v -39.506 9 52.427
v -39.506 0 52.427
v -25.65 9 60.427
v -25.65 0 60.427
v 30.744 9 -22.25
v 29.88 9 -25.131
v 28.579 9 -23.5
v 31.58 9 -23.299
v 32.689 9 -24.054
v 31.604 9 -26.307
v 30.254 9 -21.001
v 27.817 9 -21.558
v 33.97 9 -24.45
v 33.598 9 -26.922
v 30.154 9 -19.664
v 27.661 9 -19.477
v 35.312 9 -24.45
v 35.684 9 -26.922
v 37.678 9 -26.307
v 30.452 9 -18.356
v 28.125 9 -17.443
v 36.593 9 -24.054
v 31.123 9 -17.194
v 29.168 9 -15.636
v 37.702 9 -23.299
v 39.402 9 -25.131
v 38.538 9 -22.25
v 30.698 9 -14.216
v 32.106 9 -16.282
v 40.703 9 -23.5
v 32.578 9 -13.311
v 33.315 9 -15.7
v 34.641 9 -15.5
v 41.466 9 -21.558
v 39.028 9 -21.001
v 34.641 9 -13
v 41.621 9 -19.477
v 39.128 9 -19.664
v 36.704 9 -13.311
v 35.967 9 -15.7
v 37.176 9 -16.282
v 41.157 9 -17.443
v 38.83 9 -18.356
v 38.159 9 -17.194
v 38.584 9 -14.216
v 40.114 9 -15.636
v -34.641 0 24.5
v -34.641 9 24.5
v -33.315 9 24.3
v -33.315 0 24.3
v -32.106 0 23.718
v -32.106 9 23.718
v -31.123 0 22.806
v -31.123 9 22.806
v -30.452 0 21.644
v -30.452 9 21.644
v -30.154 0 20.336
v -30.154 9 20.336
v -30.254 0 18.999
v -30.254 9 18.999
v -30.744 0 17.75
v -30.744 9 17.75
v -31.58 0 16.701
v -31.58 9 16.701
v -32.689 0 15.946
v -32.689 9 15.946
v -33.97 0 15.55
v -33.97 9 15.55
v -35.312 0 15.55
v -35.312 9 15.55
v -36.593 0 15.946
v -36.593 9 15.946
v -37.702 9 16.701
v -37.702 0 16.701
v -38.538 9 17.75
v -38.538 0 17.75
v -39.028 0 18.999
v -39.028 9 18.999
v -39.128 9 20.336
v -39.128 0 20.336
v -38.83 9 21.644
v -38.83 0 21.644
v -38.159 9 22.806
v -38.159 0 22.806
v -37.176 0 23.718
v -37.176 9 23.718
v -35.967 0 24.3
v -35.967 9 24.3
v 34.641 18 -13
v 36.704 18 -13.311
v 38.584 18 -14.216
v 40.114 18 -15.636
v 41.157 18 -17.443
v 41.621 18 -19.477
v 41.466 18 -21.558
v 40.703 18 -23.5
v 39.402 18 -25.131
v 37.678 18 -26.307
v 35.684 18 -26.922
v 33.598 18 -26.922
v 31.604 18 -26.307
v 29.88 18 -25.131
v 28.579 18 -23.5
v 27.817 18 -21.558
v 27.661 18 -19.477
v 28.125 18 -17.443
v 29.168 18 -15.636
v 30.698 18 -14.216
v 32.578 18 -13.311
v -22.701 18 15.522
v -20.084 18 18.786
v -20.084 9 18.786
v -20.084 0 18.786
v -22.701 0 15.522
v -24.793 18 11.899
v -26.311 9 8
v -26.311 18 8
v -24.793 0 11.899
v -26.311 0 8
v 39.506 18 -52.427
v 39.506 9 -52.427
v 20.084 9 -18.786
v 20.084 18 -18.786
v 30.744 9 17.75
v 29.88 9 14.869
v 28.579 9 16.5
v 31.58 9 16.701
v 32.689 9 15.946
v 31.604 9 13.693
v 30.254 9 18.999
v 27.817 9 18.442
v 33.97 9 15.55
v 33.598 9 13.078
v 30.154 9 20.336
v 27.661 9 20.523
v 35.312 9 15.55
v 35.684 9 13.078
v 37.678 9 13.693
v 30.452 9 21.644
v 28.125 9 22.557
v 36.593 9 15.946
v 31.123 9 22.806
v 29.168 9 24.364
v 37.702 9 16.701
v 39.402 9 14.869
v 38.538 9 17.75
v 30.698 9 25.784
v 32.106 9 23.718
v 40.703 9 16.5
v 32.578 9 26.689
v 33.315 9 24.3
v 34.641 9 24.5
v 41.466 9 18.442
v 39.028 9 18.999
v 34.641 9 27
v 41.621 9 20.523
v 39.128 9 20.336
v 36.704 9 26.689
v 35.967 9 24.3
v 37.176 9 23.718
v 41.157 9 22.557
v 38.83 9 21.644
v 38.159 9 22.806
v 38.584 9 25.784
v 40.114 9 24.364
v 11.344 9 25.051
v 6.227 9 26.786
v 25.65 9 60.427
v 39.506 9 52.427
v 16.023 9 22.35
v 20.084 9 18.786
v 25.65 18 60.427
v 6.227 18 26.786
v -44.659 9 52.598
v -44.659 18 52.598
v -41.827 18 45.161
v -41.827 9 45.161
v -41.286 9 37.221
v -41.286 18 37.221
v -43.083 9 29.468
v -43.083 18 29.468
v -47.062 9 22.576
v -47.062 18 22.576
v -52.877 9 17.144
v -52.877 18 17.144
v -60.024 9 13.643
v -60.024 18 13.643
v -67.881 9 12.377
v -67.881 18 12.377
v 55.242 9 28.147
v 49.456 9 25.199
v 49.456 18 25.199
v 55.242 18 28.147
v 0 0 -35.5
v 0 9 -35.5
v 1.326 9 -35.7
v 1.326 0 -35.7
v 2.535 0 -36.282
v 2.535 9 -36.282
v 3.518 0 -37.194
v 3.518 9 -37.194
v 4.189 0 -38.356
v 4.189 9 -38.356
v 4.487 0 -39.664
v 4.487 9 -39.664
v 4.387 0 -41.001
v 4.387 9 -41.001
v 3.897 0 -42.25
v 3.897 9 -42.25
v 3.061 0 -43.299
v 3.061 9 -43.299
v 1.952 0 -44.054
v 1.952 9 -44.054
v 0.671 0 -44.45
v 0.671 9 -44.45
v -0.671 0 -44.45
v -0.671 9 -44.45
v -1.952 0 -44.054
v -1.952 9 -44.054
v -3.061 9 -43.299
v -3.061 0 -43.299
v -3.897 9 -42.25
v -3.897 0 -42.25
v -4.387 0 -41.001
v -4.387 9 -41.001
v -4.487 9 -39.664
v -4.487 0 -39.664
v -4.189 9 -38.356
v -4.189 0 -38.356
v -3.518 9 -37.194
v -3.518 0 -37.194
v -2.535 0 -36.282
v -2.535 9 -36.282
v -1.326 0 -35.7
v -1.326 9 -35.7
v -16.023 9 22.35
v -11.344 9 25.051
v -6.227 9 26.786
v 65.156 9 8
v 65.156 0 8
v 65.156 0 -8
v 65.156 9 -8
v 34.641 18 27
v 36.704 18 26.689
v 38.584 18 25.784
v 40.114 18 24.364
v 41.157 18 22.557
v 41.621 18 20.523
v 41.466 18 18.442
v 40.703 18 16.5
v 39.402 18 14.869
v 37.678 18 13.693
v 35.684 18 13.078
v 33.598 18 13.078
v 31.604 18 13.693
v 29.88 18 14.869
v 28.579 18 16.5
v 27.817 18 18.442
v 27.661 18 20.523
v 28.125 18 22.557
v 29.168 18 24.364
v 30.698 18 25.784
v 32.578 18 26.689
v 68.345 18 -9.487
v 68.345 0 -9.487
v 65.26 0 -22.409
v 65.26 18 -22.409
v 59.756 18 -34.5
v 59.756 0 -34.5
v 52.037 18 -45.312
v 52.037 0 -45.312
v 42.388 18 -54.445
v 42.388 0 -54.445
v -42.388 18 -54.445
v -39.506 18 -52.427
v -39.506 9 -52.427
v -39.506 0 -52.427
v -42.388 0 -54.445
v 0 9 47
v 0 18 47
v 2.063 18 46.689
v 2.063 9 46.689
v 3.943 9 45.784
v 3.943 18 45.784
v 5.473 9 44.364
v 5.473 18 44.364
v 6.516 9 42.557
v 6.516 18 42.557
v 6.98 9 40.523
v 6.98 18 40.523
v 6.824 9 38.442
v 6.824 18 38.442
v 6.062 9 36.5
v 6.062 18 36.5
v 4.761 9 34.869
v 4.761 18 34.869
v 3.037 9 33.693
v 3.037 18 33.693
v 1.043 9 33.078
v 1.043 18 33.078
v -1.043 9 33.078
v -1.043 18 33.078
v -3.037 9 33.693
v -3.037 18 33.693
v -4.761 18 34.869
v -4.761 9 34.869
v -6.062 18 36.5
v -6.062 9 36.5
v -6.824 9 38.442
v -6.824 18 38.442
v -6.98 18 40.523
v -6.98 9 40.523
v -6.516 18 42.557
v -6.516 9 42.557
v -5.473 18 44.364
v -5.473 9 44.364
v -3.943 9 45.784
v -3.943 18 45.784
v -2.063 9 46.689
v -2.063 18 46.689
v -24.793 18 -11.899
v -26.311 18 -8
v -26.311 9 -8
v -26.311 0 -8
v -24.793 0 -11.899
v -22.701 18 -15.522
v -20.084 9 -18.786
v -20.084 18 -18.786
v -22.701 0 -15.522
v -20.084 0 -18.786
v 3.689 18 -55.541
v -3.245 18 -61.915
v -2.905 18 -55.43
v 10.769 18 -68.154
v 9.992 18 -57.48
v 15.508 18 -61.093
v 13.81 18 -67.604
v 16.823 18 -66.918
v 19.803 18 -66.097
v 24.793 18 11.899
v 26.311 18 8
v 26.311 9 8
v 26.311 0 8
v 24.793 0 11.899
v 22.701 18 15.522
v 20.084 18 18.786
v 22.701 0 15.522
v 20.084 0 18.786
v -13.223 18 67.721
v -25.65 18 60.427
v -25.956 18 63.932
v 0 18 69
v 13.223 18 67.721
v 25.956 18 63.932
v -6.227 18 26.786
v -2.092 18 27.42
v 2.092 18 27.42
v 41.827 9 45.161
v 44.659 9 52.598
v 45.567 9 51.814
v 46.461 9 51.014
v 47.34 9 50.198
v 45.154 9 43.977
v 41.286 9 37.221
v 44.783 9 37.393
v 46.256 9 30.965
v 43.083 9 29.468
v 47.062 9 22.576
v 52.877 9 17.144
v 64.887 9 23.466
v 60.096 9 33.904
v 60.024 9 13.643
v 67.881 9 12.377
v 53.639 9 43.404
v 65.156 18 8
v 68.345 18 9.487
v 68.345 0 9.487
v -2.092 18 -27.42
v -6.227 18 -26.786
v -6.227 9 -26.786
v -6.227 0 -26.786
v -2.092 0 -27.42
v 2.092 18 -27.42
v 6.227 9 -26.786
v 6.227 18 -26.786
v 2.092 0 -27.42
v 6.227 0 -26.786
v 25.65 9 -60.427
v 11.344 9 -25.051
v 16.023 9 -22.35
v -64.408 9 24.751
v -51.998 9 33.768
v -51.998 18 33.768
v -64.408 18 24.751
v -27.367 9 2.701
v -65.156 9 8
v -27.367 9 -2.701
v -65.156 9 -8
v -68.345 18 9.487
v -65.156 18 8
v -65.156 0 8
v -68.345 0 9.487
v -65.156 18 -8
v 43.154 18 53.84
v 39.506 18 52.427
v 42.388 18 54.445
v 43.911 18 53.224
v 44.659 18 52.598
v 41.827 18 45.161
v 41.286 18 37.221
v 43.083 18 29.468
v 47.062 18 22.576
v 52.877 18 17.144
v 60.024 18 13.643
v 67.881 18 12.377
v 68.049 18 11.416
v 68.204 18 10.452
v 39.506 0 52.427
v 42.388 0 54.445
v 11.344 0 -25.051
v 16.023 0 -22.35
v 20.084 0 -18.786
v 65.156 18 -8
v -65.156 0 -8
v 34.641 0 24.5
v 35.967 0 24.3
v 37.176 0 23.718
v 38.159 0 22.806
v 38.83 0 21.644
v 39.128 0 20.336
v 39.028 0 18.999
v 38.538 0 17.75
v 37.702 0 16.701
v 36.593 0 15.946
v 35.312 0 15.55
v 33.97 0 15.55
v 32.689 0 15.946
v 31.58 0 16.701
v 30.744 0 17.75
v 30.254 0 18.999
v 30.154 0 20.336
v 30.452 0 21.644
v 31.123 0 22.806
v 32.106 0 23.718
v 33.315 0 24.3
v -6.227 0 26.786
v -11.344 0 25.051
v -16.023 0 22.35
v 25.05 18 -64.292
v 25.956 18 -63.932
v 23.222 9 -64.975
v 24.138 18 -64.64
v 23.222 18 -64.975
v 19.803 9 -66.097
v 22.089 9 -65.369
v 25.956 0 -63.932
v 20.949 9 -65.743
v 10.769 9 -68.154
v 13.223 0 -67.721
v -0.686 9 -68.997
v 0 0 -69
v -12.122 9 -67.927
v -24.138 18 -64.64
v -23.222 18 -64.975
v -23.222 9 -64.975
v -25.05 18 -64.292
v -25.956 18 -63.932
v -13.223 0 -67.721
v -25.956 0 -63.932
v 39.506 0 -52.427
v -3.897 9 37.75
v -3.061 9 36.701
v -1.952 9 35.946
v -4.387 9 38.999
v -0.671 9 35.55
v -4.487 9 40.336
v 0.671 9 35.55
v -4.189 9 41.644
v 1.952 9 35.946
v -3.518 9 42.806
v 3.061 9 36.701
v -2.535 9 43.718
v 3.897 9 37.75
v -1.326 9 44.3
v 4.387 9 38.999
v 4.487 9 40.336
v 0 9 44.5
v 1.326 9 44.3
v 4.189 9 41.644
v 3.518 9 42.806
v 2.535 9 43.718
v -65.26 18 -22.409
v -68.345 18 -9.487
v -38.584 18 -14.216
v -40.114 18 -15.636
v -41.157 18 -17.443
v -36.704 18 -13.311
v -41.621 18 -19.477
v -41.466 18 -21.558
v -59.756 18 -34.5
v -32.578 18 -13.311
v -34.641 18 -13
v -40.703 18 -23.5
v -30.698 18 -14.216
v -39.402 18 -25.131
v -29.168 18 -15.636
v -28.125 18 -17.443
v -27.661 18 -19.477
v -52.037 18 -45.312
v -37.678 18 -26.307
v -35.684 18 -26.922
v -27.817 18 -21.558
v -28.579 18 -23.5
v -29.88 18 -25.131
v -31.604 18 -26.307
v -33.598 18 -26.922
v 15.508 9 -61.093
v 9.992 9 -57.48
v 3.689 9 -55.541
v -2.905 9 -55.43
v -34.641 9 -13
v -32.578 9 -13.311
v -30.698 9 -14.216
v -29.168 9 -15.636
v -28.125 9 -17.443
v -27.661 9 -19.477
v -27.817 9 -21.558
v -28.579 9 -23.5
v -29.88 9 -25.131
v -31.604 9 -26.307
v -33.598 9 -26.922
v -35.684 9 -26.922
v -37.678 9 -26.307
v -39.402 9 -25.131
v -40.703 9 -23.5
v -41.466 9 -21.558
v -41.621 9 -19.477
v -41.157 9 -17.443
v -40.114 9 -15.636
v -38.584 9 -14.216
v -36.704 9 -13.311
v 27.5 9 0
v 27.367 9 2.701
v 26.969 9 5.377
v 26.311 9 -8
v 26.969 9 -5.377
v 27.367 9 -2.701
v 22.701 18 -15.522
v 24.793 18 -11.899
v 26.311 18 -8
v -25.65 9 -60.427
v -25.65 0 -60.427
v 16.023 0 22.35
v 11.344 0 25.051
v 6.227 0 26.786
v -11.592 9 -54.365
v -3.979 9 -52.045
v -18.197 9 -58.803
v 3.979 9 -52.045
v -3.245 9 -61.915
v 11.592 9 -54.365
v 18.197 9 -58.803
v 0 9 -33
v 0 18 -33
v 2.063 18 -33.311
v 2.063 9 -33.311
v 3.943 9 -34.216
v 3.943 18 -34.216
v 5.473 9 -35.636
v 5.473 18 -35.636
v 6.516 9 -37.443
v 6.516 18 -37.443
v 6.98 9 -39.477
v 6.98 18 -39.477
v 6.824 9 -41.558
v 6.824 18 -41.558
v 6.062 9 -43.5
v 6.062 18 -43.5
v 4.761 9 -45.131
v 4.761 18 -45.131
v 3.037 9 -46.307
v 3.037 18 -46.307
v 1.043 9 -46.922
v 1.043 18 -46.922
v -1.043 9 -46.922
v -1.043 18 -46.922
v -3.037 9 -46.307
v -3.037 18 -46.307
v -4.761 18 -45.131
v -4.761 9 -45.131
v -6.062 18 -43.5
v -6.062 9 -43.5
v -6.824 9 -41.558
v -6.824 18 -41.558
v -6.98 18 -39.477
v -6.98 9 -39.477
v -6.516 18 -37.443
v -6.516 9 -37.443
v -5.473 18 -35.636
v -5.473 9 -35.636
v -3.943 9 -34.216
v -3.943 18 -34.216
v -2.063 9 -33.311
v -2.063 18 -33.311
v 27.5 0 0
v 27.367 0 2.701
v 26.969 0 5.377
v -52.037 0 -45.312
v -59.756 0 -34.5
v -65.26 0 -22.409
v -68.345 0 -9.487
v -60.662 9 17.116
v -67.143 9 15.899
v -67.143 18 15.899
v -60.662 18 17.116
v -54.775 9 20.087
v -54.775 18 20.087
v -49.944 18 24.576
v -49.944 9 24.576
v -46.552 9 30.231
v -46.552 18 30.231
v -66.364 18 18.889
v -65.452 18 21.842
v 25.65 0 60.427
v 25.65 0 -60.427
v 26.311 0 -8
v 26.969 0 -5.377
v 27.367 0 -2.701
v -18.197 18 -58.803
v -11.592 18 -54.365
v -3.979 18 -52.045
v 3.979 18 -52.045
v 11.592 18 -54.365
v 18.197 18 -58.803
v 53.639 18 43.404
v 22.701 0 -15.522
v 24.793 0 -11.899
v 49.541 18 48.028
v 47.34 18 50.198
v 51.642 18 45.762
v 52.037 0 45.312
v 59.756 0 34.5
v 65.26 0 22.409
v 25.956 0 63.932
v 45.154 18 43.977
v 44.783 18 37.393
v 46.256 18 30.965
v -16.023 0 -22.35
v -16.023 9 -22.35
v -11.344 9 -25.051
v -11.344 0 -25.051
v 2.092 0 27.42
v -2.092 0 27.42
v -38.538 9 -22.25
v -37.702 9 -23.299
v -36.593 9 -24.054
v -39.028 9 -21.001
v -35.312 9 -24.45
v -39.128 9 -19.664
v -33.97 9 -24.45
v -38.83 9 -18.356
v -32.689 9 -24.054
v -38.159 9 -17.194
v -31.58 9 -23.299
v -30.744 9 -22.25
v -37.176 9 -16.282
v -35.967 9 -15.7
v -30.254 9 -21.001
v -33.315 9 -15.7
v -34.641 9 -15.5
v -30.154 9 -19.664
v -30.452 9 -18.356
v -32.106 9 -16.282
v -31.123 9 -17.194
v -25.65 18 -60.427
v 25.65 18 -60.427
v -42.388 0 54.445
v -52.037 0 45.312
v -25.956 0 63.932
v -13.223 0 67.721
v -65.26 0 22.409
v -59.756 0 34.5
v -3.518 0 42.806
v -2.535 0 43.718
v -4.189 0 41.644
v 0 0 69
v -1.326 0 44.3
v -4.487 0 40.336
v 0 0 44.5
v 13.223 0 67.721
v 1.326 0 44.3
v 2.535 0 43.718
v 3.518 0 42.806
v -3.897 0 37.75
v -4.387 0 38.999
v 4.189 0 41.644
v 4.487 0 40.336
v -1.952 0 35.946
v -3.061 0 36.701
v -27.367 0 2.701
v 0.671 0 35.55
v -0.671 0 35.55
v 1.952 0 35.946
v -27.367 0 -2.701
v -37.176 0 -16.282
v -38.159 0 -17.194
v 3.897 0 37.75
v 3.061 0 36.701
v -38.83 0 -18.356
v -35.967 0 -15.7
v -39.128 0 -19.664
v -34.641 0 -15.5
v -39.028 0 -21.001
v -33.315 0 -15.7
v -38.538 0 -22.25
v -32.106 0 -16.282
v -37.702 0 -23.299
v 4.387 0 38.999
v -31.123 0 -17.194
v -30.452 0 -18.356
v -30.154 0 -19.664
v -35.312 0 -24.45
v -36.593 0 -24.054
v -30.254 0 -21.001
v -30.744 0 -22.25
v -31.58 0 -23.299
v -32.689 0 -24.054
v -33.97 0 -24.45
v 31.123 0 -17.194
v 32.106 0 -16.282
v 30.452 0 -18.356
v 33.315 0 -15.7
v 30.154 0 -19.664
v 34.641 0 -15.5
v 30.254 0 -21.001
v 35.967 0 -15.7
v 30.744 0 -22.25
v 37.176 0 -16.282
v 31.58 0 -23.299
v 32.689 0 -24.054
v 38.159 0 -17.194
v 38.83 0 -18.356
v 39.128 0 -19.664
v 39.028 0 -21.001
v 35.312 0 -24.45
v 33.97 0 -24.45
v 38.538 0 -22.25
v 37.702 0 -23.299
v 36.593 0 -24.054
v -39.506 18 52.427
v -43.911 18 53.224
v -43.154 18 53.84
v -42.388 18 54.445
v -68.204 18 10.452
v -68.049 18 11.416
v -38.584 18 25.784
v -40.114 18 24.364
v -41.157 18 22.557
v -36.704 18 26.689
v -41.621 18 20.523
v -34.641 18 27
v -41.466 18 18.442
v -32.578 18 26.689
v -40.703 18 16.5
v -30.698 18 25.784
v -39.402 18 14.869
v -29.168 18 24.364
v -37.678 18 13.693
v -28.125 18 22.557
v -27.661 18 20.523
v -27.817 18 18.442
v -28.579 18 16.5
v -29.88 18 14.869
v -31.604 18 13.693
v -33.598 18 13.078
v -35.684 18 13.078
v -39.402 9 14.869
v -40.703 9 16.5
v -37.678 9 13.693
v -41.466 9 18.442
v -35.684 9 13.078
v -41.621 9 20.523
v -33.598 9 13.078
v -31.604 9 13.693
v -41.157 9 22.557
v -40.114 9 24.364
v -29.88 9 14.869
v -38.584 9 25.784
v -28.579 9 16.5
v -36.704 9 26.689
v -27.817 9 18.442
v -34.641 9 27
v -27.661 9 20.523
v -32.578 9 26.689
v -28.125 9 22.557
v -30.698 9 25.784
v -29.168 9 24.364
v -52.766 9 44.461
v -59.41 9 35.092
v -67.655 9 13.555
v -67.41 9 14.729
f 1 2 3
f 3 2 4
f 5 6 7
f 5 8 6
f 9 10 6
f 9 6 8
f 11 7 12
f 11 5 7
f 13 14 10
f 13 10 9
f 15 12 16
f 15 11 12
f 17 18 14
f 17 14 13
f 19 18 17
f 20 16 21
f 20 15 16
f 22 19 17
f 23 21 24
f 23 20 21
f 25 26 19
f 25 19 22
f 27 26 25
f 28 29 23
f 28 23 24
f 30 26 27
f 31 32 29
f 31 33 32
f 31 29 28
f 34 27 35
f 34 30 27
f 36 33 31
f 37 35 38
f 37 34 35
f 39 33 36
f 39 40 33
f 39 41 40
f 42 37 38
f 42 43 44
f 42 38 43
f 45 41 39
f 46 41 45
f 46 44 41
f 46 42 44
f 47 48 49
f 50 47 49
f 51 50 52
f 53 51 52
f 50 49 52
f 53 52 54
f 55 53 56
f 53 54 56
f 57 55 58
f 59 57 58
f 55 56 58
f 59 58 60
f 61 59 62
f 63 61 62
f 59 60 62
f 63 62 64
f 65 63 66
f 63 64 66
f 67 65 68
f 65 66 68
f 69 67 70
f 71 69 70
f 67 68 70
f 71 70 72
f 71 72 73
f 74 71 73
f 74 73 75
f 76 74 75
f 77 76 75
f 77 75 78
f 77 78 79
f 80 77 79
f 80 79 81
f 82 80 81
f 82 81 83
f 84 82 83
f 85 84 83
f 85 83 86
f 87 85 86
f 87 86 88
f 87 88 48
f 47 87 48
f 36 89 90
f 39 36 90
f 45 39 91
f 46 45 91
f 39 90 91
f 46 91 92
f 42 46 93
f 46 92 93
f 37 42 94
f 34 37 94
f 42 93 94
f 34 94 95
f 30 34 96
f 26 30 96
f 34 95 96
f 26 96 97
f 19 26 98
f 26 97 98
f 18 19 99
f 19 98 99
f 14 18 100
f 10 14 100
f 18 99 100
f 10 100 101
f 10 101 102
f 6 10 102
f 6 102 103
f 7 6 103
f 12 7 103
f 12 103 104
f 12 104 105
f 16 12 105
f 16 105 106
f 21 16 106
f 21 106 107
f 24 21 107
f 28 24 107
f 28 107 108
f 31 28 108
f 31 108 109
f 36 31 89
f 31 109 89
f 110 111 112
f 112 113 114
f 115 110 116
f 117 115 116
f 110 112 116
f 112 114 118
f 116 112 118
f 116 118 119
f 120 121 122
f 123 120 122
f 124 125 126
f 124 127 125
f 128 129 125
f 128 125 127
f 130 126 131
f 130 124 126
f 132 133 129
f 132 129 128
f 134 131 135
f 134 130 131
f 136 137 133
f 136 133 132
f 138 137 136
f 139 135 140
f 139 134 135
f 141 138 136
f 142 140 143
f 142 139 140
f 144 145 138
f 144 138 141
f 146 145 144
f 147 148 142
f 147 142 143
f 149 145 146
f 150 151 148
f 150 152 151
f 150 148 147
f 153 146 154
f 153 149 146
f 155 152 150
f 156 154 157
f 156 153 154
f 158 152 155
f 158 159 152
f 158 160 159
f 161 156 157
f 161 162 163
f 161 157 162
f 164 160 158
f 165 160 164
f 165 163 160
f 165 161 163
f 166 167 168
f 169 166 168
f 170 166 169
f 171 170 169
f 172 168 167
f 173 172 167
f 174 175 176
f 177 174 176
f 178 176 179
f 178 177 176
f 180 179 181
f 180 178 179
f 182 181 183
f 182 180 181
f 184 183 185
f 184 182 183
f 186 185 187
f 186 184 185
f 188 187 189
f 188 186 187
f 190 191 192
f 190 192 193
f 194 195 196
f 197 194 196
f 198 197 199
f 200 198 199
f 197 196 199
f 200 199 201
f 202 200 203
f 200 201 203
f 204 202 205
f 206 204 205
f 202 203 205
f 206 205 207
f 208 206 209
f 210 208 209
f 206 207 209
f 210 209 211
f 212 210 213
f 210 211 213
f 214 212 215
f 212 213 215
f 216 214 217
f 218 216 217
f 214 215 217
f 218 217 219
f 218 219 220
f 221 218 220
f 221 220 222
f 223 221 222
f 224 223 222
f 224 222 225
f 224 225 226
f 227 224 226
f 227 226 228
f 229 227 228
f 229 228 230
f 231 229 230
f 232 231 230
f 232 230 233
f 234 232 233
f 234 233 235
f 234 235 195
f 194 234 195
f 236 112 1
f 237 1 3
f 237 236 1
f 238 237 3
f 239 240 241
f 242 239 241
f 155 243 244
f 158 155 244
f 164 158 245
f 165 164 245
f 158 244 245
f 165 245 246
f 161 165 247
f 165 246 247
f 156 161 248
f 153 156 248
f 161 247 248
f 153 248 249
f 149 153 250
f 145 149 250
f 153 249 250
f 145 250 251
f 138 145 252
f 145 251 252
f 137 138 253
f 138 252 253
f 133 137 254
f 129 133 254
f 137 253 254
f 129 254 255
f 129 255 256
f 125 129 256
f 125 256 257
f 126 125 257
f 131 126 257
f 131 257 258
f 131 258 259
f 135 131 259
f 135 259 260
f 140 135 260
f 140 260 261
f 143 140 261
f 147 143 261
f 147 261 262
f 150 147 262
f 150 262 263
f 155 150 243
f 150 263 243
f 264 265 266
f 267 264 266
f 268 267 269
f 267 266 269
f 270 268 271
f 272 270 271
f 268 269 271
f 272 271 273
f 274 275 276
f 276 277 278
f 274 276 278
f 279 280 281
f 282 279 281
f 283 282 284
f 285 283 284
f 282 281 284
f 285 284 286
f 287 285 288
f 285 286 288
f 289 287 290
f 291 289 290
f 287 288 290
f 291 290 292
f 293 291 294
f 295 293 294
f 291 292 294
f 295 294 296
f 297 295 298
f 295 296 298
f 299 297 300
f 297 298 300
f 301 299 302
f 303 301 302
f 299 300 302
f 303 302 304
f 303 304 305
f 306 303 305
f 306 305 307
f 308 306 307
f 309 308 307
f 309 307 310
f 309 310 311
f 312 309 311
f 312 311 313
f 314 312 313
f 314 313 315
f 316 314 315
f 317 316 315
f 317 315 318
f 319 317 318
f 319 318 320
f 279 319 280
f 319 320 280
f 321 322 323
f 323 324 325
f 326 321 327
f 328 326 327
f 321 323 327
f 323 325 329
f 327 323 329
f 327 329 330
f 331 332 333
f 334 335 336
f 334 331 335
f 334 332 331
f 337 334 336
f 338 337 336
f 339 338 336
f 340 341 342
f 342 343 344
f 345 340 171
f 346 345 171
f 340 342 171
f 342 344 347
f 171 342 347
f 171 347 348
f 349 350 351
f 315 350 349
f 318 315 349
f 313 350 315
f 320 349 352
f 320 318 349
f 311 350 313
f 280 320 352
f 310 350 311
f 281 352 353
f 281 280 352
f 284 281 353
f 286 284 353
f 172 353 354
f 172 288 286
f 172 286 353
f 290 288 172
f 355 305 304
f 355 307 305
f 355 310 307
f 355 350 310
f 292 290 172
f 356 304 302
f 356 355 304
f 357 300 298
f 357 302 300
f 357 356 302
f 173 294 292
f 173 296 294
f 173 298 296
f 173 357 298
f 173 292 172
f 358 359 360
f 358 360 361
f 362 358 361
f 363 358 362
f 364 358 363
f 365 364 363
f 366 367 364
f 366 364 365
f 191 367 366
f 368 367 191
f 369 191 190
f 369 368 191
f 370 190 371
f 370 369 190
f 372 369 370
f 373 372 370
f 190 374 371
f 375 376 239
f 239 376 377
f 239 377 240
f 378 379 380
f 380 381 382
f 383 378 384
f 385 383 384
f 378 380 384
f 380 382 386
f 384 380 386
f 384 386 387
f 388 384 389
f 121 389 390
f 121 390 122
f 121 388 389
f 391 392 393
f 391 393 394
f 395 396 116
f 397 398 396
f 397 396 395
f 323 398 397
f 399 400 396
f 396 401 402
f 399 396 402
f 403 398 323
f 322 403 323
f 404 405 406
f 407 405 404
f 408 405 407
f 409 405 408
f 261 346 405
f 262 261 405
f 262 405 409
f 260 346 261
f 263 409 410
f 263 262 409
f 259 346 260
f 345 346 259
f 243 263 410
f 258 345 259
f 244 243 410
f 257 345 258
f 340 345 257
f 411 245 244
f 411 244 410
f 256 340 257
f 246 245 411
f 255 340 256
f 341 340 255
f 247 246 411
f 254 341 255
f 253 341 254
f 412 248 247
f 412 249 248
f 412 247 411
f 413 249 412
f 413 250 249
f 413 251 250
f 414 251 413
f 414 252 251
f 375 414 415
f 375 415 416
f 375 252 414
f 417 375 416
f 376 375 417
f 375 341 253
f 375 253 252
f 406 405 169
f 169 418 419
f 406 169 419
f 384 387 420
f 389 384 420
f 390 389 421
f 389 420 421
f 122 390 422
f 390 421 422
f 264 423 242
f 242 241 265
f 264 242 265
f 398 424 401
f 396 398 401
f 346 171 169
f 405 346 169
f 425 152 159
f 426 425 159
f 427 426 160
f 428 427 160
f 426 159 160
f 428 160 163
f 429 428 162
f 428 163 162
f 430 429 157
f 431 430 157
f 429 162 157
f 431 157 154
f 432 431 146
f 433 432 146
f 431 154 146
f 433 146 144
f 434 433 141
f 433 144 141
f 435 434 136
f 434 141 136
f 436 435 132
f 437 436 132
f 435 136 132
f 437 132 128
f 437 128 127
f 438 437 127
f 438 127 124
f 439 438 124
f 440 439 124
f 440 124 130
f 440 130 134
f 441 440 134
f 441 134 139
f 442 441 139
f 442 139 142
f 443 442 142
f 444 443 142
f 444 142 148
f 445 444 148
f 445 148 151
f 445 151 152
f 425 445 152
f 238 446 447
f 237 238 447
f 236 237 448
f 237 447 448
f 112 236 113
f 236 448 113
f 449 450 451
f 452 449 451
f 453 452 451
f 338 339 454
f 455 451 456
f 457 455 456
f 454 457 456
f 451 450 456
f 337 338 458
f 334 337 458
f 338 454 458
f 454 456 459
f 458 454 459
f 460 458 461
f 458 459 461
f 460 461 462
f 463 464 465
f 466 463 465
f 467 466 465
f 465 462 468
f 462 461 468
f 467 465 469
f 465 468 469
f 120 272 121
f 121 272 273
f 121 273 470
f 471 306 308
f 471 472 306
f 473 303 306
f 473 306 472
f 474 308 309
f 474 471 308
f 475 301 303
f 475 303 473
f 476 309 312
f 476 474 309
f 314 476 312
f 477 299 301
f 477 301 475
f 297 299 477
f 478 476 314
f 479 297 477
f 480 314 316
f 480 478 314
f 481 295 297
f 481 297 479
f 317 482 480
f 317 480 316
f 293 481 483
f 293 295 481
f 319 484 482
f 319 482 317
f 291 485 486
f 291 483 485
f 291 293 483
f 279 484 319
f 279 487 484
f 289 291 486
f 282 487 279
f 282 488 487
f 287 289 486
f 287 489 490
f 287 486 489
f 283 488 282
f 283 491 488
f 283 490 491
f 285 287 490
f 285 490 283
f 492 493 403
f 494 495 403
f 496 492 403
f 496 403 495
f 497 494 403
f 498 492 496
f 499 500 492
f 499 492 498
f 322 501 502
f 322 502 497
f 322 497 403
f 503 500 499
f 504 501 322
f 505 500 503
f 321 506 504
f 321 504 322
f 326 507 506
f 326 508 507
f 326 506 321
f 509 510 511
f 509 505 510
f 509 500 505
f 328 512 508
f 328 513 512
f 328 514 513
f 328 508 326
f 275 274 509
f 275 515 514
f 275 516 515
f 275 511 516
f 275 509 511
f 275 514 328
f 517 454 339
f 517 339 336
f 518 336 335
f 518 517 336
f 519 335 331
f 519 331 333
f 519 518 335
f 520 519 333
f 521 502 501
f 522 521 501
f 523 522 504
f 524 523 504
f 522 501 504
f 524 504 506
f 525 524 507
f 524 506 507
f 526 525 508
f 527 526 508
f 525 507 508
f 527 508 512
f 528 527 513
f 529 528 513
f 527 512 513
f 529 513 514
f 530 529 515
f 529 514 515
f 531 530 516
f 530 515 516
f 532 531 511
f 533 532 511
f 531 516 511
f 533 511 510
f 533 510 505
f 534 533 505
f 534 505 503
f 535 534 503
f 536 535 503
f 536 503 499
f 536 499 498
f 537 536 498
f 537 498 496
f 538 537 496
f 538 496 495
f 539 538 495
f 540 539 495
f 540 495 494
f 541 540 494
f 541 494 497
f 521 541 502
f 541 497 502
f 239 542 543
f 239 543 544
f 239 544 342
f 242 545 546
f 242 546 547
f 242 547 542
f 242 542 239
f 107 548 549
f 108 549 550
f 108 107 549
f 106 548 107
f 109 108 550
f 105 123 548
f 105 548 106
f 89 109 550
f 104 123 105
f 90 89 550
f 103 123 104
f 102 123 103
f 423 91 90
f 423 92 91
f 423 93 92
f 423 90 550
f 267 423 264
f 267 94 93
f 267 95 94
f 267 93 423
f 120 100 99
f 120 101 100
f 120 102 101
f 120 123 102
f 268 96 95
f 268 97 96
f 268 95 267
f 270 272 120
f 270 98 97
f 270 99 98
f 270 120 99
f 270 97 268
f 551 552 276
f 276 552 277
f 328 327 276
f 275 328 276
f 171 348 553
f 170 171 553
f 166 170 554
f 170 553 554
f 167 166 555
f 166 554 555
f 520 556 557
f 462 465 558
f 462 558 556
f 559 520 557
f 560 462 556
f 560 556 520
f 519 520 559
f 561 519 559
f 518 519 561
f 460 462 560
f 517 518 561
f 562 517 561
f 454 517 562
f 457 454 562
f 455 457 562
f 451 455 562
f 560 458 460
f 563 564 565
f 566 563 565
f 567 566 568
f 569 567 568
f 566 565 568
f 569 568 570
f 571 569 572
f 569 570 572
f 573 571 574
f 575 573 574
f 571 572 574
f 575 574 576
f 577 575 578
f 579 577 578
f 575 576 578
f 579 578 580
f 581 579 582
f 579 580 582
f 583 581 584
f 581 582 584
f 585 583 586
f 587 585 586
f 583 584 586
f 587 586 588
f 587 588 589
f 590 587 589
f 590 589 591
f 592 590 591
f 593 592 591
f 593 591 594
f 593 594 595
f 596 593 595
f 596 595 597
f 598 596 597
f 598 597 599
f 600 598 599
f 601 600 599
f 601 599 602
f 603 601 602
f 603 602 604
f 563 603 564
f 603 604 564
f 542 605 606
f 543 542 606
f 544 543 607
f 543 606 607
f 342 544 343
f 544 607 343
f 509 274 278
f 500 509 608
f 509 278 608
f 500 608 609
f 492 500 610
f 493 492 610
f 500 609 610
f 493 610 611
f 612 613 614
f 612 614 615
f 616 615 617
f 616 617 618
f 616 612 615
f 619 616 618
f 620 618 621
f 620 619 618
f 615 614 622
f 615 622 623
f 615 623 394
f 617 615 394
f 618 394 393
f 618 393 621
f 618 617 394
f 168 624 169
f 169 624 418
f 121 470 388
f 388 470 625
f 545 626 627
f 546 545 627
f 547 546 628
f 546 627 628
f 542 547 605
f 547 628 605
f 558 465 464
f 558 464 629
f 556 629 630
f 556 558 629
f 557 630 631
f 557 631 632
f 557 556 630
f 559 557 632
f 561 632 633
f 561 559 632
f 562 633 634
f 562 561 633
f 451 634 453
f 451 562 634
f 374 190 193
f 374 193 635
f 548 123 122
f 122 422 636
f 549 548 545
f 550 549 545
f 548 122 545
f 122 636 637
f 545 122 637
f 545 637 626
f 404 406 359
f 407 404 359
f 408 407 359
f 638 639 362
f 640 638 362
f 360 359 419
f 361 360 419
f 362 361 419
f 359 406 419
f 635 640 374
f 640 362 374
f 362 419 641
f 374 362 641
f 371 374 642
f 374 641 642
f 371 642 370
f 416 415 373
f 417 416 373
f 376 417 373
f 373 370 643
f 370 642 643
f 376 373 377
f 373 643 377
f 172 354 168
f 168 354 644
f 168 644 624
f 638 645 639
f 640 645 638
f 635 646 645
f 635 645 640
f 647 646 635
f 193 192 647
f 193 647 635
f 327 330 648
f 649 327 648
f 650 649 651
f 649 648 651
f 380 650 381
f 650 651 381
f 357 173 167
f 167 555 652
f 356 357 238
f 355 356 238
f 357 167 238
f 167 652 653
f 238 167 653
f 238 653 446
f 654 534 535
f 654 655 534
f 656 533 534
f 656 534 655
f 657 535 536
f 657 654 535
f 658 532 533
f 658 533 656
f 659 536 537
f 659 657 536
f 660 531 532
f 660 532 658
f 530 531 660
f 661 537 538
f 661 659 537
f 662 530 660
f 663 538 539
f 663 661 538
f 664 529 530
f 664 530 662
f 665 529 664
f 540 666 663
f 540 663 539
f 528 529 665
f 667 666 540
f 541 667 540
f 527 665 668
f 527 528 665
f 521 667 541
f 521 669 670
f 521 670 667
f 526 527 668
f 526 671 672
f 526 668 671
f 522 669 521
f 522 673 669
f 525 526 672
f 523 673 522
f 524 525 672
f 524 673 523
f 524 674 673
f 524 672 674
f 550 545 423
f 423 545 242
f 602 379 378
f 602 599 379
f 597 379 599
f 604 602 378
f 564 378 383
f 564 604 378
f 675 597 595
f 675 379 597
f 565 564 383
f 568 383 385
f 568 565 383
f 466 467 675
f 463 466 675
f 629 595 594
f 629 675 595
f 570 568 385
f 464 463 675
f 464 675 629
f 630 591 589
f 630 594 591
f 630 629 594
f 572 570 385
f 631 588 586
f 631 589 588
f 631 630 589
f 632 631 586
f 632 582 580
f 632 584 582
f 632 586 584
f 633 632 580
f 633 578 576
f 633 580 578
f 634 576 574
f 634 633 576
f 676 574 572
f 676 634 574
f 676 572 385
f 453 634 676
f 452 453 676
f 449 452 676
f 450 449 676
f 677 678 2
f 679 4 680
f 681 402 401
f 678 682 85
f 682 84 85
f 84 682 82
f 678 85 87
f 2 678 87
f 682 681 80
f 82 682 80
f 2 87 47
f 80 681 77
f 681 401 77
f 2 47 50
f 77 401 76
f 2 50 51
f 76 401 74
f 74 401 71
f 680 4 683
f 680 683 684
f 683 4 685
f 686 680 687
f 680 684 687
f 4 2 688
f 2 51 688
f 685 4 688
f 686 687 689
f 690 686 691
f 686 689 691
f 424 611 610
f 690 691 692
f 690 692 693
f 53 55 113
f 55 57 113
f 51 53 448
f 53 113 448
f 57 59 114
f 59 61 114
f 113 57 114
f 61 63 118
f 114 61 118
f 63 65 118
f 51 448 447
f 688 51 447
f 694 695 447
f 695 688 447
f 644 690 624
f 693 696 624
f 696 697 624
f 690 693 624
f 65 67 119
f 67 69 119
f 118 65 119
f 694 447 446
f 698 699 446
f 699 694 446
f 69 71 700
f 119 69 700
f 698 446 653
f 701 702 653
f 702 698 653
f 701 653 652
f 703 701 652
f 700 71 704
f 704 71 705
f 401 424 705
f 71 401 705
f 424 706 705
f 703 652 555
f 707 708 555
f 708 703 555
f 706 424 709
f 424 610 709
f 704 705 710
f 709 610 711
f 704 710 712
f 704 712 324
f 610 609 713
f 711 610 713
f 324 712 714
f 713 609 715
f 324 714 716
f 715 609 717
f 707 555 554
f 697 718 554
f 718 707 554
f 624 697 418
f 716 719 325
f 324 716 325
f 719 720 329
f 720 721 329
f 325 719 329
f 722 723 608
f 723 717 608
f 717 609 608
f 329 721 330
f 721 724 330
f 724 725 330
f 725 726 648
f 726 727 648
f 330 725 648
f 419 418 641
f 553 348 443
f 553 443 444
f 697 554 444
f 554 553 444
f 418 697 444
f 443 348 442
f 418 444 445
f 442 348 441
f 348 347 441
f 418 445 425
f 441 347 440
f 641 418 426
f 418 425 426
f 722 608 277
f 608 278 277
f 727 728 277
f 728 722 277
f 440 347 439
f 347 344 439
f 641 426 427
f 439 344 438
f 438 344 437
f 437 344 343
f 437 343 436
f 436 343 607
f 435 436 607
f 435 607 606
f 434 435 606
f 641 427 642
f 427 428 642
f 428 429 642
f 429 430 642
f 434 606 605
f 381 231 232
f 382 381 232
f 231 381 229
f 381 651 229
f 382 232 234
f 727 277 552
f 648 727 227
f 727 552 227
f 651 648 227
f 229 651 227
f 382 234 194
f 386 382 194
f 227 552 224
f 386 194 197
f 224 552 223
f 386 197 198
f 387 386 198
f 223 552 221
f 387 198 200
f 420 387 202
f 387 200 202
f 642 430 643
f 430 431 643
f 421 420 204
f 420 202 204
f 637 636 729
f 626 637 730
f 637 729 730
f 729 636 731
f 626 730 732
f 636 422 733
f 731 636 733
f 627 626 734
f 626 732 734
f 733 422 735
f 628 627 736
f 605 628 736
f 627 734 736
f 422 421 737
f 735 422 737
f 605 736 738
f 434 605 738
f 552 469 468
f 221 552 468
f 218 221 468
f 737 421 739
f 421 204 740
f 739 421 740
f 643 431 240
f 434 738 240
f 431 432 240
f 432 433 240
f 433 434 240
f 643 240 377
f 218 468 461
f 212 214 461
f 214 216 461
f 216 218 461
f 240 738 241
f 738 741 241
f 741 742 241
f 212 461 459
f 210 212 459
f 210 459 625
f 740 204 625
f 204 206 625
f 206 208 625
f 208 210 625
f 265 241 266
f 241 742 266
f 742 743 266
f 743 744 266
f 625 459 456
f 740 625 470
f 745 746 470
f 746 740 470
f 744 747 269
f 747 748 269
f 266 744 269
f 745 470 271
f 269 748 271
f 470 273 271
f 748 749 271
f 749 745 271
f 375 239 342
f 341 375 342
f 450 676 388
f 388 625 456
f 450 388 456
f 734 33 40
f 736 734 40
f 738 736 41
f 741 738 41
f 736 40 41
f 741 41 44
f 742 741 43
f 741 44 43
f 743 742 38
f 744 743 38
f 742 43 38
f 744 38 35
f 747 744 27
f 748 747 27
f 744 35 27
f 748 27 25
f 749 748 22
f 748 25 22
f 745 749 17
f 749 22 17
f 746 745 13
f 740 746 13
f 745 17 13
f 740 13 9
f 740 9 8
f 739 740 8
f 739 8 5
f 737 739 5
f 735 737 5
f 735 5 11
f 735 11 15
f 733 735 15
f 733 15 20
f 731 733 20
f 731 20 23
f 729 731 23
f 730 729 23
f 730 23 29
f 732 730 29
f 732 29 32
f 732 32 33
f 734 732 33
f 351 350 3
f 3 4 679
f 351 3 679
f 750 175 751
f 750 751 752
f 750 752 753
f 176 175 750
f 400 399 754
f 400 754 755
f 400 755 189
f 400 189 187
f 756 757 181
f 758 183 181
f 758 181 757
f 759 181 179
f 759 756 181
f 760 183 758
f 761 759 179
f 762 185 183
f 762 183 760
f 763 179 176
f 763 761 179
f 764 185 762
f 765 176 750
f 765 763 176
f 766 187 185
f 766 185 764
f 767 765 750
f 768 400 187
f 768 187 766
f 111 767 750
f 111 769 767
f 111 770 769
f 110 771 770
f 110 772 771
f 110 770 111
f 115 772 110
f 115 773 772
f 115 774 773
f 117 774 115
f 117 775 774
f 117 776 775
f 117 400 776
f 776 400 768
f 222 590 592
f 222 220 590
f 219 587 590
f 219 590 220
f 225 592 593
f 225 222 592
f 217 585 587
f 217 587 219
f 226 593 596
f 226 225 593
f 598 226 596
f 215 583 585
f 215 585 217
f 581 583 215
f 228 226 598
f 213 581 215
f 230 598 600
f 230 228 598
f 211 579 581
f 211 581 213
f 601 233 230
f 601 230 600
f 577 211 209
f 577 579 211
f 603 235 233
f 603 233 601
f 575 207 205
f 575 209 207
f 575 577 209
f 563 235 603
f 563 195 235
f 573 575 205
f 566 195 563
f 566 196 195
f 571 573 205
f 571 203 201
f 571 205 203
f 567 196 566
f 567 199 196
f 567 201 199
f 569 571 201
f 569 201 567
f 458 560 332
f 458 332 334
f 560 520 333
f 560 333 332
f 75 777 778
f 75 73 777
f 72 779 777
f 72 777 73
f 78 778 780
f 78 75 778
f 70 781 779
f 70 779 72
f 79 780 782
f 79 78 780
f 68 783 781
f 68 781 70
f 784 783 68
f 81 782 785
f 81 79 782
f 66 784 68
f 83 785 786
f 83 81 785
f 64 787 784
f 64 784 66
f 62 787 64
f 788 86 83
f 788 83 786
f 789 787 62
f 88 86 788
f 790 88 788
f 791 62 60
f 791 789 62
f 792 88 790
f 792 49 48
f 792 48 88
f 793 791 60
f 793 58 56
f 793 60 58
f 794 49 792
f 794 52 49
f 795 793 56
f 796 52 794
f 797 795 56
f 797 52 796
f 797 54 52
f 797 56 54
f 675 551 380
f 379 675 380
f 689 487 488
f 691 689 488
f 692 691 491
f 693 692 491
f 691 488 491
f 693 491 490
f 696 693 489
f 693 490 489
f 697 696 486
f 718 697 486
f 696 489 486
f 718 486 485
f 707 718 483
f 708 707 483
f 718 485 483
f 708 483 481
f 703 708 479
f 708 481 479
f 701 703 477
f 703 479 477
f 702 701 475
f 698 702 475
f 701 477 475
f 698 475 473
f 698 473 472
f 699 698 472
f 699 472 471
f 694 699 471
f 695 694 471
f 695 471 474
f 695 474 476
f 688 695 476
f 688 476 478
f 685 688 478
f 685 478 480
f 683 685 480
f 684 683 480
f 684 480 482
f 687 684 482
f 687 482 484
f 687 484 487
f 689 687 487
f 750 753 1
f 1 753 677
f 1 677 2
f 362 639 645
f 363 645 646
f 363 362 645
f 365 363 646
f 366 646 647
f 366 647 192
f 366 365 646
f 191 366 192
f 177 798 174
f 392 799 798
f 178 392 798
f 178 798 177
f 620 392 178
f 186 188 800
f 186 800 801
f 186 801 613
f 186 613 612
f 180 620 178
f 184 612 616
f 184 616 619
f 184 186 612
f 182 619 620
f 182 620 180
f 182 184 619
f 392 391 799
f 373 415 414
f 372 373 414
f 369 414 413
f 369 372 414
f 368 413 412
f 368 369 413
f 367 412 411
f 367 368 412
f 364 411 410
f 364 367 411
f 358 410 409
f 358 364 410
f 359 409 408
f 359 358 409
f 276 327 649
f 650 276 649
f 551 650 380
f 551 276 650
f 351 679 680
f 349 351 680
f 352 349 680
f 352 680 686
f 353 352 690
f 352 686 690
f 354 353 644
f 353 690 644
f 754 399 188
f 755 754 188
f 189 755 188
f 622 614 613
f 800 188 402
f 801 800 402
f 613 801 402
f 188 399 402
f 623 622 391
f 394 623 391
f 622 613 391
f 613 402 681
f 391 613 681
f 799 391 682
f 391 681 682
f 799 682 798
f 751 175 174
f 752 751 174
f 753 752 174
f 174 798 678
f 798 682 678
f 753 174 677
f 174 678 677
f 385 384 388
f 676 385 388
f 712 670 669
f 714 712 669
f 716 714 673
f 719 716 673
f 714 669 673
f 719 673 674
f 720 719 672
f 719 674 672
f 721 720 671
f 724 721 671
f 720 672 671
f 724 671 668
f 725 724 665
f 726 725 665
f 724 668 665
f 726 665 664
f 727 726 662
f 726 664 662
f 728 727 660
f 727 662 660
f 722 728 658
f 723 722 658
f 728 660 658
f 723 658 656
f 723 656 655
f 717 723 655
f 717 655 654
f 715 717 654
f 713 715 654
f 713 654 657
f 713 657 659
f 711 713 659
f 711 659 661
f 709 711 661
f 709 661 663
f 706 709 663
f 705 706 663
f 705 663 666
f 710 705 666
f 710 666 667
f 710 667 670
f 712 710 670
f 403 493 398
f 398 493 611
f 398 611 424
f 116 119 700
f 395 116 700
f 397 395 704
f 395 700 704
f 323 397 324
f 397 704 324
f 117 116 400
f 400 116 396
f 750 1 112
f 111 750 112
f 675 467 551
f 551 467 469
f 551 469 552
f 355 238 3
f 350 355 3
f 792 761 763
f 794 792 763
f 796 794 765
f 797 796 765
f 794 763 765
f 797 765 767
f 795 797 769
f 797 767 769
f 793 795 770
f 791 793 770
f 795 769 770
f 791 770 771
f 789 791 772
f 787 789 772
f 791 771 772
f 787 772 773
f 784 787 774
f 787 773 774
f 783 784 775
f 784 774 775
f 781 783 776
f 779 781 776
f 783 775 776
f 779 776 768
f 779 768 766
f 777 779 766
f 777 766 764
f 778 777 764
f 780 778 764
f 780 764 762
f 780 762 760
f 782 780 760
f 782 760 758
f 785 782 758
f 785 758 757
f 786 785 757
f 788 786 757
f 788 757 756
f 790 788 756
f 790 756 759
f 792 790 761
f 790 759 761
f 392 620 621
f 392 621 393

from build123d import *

# Parameters (mm, degrees)
BOSS_EXTRUDE2_DEPTH   = 18
BOSS_EXTRUDE2_2_DEPTH = 18
BOSS_EXTRUDE2_3_DEPTH = 18
BOSS_EXTRUDE2_4_DEPTH = 18
BOSS_EXTRUDE2_5_DEPTH = 18
BOSS_EXTRUDE2_6_DEPTH = 18
BOSS_EXTRUDE3_DEPTH   = 9
SKETCH2_R             = 7
SKETCH2_R_2           = 4.5
CUT_EXTRUDE1_DEPTH    = 9
SKETCH2_3_R           = 4.5
CUT_EXTRUDE2_DEPTH    = 18
CUT_EXTRUDE3_START    = -9
CUT_EXTRUDE3_DEPTH    = 9


with BuildPart() as part:
    # Sketch1 → Boss-Extrude2 (new body)
    with BuildSketch(Plane(origin=(0, 0, 0), x_dir=(1, 0, 0), z_dir=(0, 1, 0))):
        with BuildLine():
            ThreePointArc((26.310644234, -8), (23.815698604, -13.75), (20.083525347, -18.785686296))
            Line((20.083525347, -18.785686296), (39.506230912, -52.426799156))
            Line((39.506230912, -52.426799156), (42.388242893, -54.44480567))
            ThreePointArc((42.388242893, -54.44480567), (59.755752861, -34.5), (68.344706261, -9.486892332))
            Line((68.344706261, -9.486892332), (65.156055364, -8))
            Line((65.156055364, -8), (26.310644234, -8))
        make_face()
    extrude(amount=BOSS_EXTRUDE2_DEPTH)



with BuildPart() as body_2:
    # Sketch1 → Boss-Extrude2 2 (new body)
    with BuildSketch(Plane(origin=(0, 0, 0), x_dir=(1, 0, 0), z_dir=(0, 1, 0))):
        with BuildLine():
            Line((25.649824452, -60.426799156), (6.227118887, -26.785686296))
            ThreePointArc((6.227118887, -26.785686296), (0, -27.5), (-6.227118887, -26.785686296))
            Line((-6.227118887, -26.785686296), (-25.649824452, -60.426799156))
            Line((-25.649824452, -60.426799156), (-25.956463368, -63.931698002))
            ThreePointArc((-25.956463368, -63.931698002), (0, -69), (25.956463368, -63.931698002))
            Line((25.956463368, -63.931698002), (25.649824452, -60.426799156))
        make_face()
    extrude(amount=BOSS_EXTRUDE2_2_DEPTH)


with BuildPart() as body_3:
    # Sketch1 → Boss-Extrude2 3 (new body)
    with BuildSketch(Plane(origin=(0, 0, 0), x_dir=(1, 0, 0), z_dir=(0, 1, 0))):
        with BuildLine():
            Line((-39.506230912, -52.426799156), (-20.083525347, -18.785686296))
            ThreePointArc((-20.083525347, -18.785686296), (-23.815698604, -13.75), (-26.310644234, -8))
            Line((-26.310644234, -8), (-65.156055364, -8))
            Line((-65.156055364, -8), (-68.344706261, -9.486892332))
            ThreePointArc((-68.344706261, -9.486892332), (-59.755752861, -34.5), (-42.388242893, -54.44480567))
            Line((-42.388242893, -54.44480567), (-39.506230912, -52.426799156))
        make_face()
    extrude(amount=BOSS_EXTRUDE2_3_DEPTH)


with BuildPart() as body_4:
    # Sketch1 → Boss-Extrude2 4 (new body)
    with BuildSketch(Plane(origin=(0, 0, 0), x_dir=(1, 0, 0), z_dir=(0, 1, 0))):
        with BuildLine():
            Line((26.310644234, 8), (65.156055364, 8))
            Line((65.156055364, 8), (68.344706261, 9.486892332))
            ThreePointArc((68.344706261, 9.486892332), (59.755752861, 34.5), (42.388242893, 54.44480567))
            Line((42.388242893, 54.44480567), (39.506230912, 52.426799156))
            Line((39.506230912, 52.426799156), (20.083525347, 18.785686296))
            ThreePointArc((20.083525347, 18.785686296), (23.815698604, 13.75), (26.310644234, 8))
        make_face()
    extrude(amount=BOSS_EXTRUDE2_4_DEPTH)


with BuildPart() as body_5:
    # Sketch1 → Boss-Extrude2 5 (new body)
    with BuildSketch(Plane(origin=(0, 0, 0), x_dir=(1, 0, 0), z_dir=(0, 1, 0))):
        with BuildLine():
            Line((-65.156055364, 8), (-26.310644234, 8))
            ThreePointArc((-26.310644234, 8), (-23.815698604, 13.75), (-20.083525347, 18.785686296))
            Line((-20.083525347, 18.785686296), (-39.506230912, 52.426799156))
            Line((-39.506230912, 52.426799156), (-42.388242893, 54.44480567))
            ThreePointArc((-42.388242893, 54.44480567), (-59.755752861, 34.5), (-68.344706261, 9.486892332))
            Line((-68.344706261, 9.486892332), (-65.156055364, 8))
        make_face()
    extrude(amount=BOSS_EXTRUDE2_5_DEPTH)


with BuildPart() as body_6:
    # Sketch1 → Boss-Extrude2 6 (new body)
    with BuildSketch(Plane(origin=(0, 0, 0), x_dir=(1, 0, 0), z_dir=(0, 1, 0))):
        with BuildLine():
            ThreePointArc((-6.227118887, 26.785686296), (0, 27.5), (6.227118887, 26.785686296))
            Line((6.227118887, 26.785686296), (25.649824452, 60.426799156))
            Line((25.649824452, 60.426799156), (25.956463368, 63.931698002))
            ThreePointArc((25.956463368, 63.931698002), (0, 69), (-25.956463368, 63.931698002))
            Line((-25.956463368, 63.931698002), (-25.649824452, 60.426799156))
            Line((-25.649824452, 60.426799156), (-6.227118887, 26.785686296))
        make_face()
    extrude(amount=BOSS_EXTRUDE2_6_DEPTH)


with BuildPart() as part_1:
    add(part.part)

    add(body_2.part)  # Boss-Extrude3 merges body 2

    add(body_3.part)  # Boss-Extrude3 merges body 3

    add(body_4.part)  # Boss-Extrude3 merges body 4

    add(body_5.part)  # Boss-Extrude3 merges body 5

    add(body_6.part)  # Boss-Extrude3 merges body 6
    # Sketch1<3> → Boss-Extrude3 (add)
    with BuildSketch(Plane(origin=(0, 0, 0), x_dir=(1, 0, 0), z_dir=(0, 1, 0))):
        with BuildLine():
            Line((39.506230912, -52.426799156), (20.083525347, -18.785686296))
            ThreePointArc((20.083525347, -18.785686296), (13.75, -23.815698604), (6.227118887, -26.785686296))
            Line((6.227118887, -26.785686296), (25.649824452, -60.426799156))
            Line((25.649824452, -60.426799156), (39.506230912, -52.426799156))
        make_face()
        with BuildLine():
            ThreePointArc((26.310644234, 8), (27.5, 0), (26.310644234, -8))
            Line((26.310644234, -8), (65.156055364, -8))
            Line((65.156055364, -8), (65.156055364, 8))
            Line((65.156055364, 8), (26.310644234, 8))
        make_face()
        with BuildLine():
            Line((-25.649824452, -60.426799156), (-6.227118887, -26.785686296))
            ThreePointArc((-6.227118887, -26.785686296), (-13.75, -23.815698604), (-20.083525347, -18.785686296))
            Line((-20.083525347, -18.785686296), (-39.506230912, -52.426799156))
            Line((-39.506230912, -52.426799156), (-25.649824452, -60.426799156))
        make_face()
        with BuildLine():
            Line((-65.156055364, -8), (-26.310644234, -8))
            ThreePointArc((-26.310644234, -8), (-27.5, 0), (-26.310644234, 8))
            Line((-26.310644234, 8), (-65.156055364, 8))
            Line((-65.156055364, 8), (-65.156055364, -8))
        make_face()
        with BuildLine():
            ThreePointArc((6.227118887, 26.785686296), (13.75, 23.815698604), (20.083525347, 18.785686296))
            Line((20.083525347, 18.785686296), (39.506230912, 52.426799156))
            Line((39.506230912, 52.426799156), (25.649824452, 60.426799156))
            Line((25.649824452, 60.426799156), (6.227118887, 26.785686296))
        make_face()
        with BuildLine():
            Line((-39.506230912, 52.426799156), (-20.083525347, 18.785686296))
            ThreePointArc((-20.083525347, 18.785686296), (-13.75, 23.815698604), (-6.227118887, 26.785686296))
            Line((-6.227118887, 26.785686296), (-25.649824452, 60.426799156))
            Line((-25.649824452, 60.426799156), (-39.506230912, 52.426799156))
        make_face()
    extrude(amount=BOSS_EXTRUDE3_DEPTH)

    # Sketch2 → Cut-Extrude1 (cut)
    # profile 1 of 6: a face of its own
    with BuildSketch(Plane(origin=(0, 18, 0), x_dir=(1, 0, 0), z_dir=(0, 1, 0))):
        with Locations((0, 40)):
            Circle(SKETCH2_R)
        with Locations((0, 40)):
            Circle(SKETCH2_R_2, mode=Mode.SUBTRACT)
    # profile 2 of 6: a face of its own
    with BuildSketch(Plane(origin=(0, 18, 0), x_dir=(1, 0, 0), z_dir=(0, 1, 0))):
        with Locations((34.641016151, 20)):
            Circle(SKETCH2_R)
        with Locations((34.641016151, 20)):
            Circle(SKETCH2_R_2, mode=Mode.SUBTRACT)
    # profile 3 of 6: a face of its own
    with BuildSketch(Plane(origin=(0, 18, 0), x_dir=(1, 0, 0), z_dir=(0, 1, 0))):
        with Locations((34.641016151, -20)):
            Circle(SKETCH2_R)
        with Locations((34.641016151, -20)):
            Circle(SKETCH2_R_2, mode=Mode.SUBTRACT)
    # profile 4 of 6: a face of its own
    with BuildSketch(Plane(origin=(0, 18, 0), x_dir=(1, 0, 0), z_dir=(0, 1, 0))):
        with Locations((0, -40)):
            Circle(SKETCH2_R)
        with Locations((0, -40)):
            Circle(SKETCH2_R_2, mode=Mode.SUBTRACT)
    # profile 5 of 6: a face of its own
    with BuildSketch(Plane(origin=(0, 18, 0), x_dir=(1, 0, 0), z_dir=(0, 1, 0))):
        with Locations((-34.641016151, -20)):
            Circle(SKETCH2_R)
        with Locations((-34.641016151, -20)):
            Circle(SKETCH2_R_2, mode=Mode.SUBTRACT)
    # profile 6 of 6: a face of its own
    with BuildSketch(Plane(origin=(0, 18, 0), x_dir=(1, 0, 0), z_dir=(0, 1, 0))):
        with Locations((-34.641016151, 20)):
            Circle(SKETCH2_R)
        with Locations((-34.641016151, 20)):
            Circle(SKETCH2_R_2, mode=Mode.SUBTRACT)
    extrude(amount=-CUT_EXTRUDE1_DEPTH, mode=Mode.SUBTRACT)

    # Sketch2<3> → Cut-Extrude2 (cut)
    with BuildSketch(Plane(origin=(0, 18, 0), x_dir=(1, 0, 0), z_dir=(0, 1, 0))):
        with Locations((0, 40)):
            Circle(SKETCH2_3_R)
        with Locations((34.641016151, 20)):
            Circle(SKETCH2_3_R)
        with Locations((34.641016151, -20)):
            Circle(SKETCH2_3_R)
        with Locations((0, -40)):
            Circle(SKETCH2_3_R)
        with Locations((-34.641016151, -20)):
            Circle(SKETCH2_3_R)
        with Locations((-34.641016151, 20)):
            Circle(SKETCH2_3_R)
    extrude(amount=-CUT_EXTRUDE2_DEPTH, mode=Mode.SUBTRACT)

    # Sketch6 → Cut-Extrude3 (cut)
    with BuildSketch(Plane(origin=(0, 18, 0), x_dir=(1, 0, 0), z_dir=(0, 1, 0)).offset(CUT_EXTRUDE3_START)):
        with BuildLine():
            Line((-46.551509731, -30.230903894), (-51.997575213, -33.767620171))
            Line((-51.997575213, -33.767620171), (-64.408016757, -24.750906597))
            ThreePointArc((-64.408016757, -24.750906597), (-56.283011493, -39.915192813), (-44.65912882, -52.598119862))
            ThreePointArc((-44.65912882, -52.598119862), (-44.816814646, -25.875), (-67.880872402, -12.376880138))
            ThreePointArc((-67.880872402, -12.376880138), (-67.535074395, -14.142620919), (-67.143353435, -15.898744905))
            ThreePointArc((-67.143353435, -15.898744905), (-54.774815631, -20.086976906), (-46.551509731, -30.230903894))
        make_face()
        with BuildLine():
            Line((-2.904975886, 55.430241959), (-3.244829287, 61.915031155))
            Line((-3.244829287, 61.915031155), (10.769094499, 68.154432018))
            ThreePointArc((10.769094499, 68.154432018), (-6.426065226, 68.700114161), (-23.221743582, 64.975))
            ThreePointArc((-23.221743582, 64.975), (0, 51.75), (23.221743582, 64.975))
            ThreePointArc((23.221743582, 64.975), (21.519668206, 65.558400532), (19.802959741, 66.097222222))
            ThreePointArc((19.802959741, 66.097222222), (9.99157553, 57.479870277), (-2.904975886, 55.430241959))
        make_face()
        with BuildLine():
            Line((49.456485617, -25.199338065), (55.2424045, -28.147410984))
            Line((55.2424045, -28.147410984), (53.638922259, -43.40352542))
            ThreePointArc((53.638922259, -43.40352542), (62.709076719, -28.784921348), (67.880872402, -12.376880138))
            ThreePointArc((67.880872402, -12.376880138), (44.816814646, -25.875), (44.65912882, -52.598119862))
            ThreePointArc((44.65912882, -52.598119862), (46.015406189, -51.415779613), (47.340393693, -50.198477317))
            ThreePointArc((47.340393693, -50.198477317), (44.783240101, -37.392893372), (49.456485617, -25.199338065))
        make_face()
    extrude(amount=CUT_EXTRUDE3_DEPTH, mode=Mode.SUBTRACT)


solid = part_1.part
